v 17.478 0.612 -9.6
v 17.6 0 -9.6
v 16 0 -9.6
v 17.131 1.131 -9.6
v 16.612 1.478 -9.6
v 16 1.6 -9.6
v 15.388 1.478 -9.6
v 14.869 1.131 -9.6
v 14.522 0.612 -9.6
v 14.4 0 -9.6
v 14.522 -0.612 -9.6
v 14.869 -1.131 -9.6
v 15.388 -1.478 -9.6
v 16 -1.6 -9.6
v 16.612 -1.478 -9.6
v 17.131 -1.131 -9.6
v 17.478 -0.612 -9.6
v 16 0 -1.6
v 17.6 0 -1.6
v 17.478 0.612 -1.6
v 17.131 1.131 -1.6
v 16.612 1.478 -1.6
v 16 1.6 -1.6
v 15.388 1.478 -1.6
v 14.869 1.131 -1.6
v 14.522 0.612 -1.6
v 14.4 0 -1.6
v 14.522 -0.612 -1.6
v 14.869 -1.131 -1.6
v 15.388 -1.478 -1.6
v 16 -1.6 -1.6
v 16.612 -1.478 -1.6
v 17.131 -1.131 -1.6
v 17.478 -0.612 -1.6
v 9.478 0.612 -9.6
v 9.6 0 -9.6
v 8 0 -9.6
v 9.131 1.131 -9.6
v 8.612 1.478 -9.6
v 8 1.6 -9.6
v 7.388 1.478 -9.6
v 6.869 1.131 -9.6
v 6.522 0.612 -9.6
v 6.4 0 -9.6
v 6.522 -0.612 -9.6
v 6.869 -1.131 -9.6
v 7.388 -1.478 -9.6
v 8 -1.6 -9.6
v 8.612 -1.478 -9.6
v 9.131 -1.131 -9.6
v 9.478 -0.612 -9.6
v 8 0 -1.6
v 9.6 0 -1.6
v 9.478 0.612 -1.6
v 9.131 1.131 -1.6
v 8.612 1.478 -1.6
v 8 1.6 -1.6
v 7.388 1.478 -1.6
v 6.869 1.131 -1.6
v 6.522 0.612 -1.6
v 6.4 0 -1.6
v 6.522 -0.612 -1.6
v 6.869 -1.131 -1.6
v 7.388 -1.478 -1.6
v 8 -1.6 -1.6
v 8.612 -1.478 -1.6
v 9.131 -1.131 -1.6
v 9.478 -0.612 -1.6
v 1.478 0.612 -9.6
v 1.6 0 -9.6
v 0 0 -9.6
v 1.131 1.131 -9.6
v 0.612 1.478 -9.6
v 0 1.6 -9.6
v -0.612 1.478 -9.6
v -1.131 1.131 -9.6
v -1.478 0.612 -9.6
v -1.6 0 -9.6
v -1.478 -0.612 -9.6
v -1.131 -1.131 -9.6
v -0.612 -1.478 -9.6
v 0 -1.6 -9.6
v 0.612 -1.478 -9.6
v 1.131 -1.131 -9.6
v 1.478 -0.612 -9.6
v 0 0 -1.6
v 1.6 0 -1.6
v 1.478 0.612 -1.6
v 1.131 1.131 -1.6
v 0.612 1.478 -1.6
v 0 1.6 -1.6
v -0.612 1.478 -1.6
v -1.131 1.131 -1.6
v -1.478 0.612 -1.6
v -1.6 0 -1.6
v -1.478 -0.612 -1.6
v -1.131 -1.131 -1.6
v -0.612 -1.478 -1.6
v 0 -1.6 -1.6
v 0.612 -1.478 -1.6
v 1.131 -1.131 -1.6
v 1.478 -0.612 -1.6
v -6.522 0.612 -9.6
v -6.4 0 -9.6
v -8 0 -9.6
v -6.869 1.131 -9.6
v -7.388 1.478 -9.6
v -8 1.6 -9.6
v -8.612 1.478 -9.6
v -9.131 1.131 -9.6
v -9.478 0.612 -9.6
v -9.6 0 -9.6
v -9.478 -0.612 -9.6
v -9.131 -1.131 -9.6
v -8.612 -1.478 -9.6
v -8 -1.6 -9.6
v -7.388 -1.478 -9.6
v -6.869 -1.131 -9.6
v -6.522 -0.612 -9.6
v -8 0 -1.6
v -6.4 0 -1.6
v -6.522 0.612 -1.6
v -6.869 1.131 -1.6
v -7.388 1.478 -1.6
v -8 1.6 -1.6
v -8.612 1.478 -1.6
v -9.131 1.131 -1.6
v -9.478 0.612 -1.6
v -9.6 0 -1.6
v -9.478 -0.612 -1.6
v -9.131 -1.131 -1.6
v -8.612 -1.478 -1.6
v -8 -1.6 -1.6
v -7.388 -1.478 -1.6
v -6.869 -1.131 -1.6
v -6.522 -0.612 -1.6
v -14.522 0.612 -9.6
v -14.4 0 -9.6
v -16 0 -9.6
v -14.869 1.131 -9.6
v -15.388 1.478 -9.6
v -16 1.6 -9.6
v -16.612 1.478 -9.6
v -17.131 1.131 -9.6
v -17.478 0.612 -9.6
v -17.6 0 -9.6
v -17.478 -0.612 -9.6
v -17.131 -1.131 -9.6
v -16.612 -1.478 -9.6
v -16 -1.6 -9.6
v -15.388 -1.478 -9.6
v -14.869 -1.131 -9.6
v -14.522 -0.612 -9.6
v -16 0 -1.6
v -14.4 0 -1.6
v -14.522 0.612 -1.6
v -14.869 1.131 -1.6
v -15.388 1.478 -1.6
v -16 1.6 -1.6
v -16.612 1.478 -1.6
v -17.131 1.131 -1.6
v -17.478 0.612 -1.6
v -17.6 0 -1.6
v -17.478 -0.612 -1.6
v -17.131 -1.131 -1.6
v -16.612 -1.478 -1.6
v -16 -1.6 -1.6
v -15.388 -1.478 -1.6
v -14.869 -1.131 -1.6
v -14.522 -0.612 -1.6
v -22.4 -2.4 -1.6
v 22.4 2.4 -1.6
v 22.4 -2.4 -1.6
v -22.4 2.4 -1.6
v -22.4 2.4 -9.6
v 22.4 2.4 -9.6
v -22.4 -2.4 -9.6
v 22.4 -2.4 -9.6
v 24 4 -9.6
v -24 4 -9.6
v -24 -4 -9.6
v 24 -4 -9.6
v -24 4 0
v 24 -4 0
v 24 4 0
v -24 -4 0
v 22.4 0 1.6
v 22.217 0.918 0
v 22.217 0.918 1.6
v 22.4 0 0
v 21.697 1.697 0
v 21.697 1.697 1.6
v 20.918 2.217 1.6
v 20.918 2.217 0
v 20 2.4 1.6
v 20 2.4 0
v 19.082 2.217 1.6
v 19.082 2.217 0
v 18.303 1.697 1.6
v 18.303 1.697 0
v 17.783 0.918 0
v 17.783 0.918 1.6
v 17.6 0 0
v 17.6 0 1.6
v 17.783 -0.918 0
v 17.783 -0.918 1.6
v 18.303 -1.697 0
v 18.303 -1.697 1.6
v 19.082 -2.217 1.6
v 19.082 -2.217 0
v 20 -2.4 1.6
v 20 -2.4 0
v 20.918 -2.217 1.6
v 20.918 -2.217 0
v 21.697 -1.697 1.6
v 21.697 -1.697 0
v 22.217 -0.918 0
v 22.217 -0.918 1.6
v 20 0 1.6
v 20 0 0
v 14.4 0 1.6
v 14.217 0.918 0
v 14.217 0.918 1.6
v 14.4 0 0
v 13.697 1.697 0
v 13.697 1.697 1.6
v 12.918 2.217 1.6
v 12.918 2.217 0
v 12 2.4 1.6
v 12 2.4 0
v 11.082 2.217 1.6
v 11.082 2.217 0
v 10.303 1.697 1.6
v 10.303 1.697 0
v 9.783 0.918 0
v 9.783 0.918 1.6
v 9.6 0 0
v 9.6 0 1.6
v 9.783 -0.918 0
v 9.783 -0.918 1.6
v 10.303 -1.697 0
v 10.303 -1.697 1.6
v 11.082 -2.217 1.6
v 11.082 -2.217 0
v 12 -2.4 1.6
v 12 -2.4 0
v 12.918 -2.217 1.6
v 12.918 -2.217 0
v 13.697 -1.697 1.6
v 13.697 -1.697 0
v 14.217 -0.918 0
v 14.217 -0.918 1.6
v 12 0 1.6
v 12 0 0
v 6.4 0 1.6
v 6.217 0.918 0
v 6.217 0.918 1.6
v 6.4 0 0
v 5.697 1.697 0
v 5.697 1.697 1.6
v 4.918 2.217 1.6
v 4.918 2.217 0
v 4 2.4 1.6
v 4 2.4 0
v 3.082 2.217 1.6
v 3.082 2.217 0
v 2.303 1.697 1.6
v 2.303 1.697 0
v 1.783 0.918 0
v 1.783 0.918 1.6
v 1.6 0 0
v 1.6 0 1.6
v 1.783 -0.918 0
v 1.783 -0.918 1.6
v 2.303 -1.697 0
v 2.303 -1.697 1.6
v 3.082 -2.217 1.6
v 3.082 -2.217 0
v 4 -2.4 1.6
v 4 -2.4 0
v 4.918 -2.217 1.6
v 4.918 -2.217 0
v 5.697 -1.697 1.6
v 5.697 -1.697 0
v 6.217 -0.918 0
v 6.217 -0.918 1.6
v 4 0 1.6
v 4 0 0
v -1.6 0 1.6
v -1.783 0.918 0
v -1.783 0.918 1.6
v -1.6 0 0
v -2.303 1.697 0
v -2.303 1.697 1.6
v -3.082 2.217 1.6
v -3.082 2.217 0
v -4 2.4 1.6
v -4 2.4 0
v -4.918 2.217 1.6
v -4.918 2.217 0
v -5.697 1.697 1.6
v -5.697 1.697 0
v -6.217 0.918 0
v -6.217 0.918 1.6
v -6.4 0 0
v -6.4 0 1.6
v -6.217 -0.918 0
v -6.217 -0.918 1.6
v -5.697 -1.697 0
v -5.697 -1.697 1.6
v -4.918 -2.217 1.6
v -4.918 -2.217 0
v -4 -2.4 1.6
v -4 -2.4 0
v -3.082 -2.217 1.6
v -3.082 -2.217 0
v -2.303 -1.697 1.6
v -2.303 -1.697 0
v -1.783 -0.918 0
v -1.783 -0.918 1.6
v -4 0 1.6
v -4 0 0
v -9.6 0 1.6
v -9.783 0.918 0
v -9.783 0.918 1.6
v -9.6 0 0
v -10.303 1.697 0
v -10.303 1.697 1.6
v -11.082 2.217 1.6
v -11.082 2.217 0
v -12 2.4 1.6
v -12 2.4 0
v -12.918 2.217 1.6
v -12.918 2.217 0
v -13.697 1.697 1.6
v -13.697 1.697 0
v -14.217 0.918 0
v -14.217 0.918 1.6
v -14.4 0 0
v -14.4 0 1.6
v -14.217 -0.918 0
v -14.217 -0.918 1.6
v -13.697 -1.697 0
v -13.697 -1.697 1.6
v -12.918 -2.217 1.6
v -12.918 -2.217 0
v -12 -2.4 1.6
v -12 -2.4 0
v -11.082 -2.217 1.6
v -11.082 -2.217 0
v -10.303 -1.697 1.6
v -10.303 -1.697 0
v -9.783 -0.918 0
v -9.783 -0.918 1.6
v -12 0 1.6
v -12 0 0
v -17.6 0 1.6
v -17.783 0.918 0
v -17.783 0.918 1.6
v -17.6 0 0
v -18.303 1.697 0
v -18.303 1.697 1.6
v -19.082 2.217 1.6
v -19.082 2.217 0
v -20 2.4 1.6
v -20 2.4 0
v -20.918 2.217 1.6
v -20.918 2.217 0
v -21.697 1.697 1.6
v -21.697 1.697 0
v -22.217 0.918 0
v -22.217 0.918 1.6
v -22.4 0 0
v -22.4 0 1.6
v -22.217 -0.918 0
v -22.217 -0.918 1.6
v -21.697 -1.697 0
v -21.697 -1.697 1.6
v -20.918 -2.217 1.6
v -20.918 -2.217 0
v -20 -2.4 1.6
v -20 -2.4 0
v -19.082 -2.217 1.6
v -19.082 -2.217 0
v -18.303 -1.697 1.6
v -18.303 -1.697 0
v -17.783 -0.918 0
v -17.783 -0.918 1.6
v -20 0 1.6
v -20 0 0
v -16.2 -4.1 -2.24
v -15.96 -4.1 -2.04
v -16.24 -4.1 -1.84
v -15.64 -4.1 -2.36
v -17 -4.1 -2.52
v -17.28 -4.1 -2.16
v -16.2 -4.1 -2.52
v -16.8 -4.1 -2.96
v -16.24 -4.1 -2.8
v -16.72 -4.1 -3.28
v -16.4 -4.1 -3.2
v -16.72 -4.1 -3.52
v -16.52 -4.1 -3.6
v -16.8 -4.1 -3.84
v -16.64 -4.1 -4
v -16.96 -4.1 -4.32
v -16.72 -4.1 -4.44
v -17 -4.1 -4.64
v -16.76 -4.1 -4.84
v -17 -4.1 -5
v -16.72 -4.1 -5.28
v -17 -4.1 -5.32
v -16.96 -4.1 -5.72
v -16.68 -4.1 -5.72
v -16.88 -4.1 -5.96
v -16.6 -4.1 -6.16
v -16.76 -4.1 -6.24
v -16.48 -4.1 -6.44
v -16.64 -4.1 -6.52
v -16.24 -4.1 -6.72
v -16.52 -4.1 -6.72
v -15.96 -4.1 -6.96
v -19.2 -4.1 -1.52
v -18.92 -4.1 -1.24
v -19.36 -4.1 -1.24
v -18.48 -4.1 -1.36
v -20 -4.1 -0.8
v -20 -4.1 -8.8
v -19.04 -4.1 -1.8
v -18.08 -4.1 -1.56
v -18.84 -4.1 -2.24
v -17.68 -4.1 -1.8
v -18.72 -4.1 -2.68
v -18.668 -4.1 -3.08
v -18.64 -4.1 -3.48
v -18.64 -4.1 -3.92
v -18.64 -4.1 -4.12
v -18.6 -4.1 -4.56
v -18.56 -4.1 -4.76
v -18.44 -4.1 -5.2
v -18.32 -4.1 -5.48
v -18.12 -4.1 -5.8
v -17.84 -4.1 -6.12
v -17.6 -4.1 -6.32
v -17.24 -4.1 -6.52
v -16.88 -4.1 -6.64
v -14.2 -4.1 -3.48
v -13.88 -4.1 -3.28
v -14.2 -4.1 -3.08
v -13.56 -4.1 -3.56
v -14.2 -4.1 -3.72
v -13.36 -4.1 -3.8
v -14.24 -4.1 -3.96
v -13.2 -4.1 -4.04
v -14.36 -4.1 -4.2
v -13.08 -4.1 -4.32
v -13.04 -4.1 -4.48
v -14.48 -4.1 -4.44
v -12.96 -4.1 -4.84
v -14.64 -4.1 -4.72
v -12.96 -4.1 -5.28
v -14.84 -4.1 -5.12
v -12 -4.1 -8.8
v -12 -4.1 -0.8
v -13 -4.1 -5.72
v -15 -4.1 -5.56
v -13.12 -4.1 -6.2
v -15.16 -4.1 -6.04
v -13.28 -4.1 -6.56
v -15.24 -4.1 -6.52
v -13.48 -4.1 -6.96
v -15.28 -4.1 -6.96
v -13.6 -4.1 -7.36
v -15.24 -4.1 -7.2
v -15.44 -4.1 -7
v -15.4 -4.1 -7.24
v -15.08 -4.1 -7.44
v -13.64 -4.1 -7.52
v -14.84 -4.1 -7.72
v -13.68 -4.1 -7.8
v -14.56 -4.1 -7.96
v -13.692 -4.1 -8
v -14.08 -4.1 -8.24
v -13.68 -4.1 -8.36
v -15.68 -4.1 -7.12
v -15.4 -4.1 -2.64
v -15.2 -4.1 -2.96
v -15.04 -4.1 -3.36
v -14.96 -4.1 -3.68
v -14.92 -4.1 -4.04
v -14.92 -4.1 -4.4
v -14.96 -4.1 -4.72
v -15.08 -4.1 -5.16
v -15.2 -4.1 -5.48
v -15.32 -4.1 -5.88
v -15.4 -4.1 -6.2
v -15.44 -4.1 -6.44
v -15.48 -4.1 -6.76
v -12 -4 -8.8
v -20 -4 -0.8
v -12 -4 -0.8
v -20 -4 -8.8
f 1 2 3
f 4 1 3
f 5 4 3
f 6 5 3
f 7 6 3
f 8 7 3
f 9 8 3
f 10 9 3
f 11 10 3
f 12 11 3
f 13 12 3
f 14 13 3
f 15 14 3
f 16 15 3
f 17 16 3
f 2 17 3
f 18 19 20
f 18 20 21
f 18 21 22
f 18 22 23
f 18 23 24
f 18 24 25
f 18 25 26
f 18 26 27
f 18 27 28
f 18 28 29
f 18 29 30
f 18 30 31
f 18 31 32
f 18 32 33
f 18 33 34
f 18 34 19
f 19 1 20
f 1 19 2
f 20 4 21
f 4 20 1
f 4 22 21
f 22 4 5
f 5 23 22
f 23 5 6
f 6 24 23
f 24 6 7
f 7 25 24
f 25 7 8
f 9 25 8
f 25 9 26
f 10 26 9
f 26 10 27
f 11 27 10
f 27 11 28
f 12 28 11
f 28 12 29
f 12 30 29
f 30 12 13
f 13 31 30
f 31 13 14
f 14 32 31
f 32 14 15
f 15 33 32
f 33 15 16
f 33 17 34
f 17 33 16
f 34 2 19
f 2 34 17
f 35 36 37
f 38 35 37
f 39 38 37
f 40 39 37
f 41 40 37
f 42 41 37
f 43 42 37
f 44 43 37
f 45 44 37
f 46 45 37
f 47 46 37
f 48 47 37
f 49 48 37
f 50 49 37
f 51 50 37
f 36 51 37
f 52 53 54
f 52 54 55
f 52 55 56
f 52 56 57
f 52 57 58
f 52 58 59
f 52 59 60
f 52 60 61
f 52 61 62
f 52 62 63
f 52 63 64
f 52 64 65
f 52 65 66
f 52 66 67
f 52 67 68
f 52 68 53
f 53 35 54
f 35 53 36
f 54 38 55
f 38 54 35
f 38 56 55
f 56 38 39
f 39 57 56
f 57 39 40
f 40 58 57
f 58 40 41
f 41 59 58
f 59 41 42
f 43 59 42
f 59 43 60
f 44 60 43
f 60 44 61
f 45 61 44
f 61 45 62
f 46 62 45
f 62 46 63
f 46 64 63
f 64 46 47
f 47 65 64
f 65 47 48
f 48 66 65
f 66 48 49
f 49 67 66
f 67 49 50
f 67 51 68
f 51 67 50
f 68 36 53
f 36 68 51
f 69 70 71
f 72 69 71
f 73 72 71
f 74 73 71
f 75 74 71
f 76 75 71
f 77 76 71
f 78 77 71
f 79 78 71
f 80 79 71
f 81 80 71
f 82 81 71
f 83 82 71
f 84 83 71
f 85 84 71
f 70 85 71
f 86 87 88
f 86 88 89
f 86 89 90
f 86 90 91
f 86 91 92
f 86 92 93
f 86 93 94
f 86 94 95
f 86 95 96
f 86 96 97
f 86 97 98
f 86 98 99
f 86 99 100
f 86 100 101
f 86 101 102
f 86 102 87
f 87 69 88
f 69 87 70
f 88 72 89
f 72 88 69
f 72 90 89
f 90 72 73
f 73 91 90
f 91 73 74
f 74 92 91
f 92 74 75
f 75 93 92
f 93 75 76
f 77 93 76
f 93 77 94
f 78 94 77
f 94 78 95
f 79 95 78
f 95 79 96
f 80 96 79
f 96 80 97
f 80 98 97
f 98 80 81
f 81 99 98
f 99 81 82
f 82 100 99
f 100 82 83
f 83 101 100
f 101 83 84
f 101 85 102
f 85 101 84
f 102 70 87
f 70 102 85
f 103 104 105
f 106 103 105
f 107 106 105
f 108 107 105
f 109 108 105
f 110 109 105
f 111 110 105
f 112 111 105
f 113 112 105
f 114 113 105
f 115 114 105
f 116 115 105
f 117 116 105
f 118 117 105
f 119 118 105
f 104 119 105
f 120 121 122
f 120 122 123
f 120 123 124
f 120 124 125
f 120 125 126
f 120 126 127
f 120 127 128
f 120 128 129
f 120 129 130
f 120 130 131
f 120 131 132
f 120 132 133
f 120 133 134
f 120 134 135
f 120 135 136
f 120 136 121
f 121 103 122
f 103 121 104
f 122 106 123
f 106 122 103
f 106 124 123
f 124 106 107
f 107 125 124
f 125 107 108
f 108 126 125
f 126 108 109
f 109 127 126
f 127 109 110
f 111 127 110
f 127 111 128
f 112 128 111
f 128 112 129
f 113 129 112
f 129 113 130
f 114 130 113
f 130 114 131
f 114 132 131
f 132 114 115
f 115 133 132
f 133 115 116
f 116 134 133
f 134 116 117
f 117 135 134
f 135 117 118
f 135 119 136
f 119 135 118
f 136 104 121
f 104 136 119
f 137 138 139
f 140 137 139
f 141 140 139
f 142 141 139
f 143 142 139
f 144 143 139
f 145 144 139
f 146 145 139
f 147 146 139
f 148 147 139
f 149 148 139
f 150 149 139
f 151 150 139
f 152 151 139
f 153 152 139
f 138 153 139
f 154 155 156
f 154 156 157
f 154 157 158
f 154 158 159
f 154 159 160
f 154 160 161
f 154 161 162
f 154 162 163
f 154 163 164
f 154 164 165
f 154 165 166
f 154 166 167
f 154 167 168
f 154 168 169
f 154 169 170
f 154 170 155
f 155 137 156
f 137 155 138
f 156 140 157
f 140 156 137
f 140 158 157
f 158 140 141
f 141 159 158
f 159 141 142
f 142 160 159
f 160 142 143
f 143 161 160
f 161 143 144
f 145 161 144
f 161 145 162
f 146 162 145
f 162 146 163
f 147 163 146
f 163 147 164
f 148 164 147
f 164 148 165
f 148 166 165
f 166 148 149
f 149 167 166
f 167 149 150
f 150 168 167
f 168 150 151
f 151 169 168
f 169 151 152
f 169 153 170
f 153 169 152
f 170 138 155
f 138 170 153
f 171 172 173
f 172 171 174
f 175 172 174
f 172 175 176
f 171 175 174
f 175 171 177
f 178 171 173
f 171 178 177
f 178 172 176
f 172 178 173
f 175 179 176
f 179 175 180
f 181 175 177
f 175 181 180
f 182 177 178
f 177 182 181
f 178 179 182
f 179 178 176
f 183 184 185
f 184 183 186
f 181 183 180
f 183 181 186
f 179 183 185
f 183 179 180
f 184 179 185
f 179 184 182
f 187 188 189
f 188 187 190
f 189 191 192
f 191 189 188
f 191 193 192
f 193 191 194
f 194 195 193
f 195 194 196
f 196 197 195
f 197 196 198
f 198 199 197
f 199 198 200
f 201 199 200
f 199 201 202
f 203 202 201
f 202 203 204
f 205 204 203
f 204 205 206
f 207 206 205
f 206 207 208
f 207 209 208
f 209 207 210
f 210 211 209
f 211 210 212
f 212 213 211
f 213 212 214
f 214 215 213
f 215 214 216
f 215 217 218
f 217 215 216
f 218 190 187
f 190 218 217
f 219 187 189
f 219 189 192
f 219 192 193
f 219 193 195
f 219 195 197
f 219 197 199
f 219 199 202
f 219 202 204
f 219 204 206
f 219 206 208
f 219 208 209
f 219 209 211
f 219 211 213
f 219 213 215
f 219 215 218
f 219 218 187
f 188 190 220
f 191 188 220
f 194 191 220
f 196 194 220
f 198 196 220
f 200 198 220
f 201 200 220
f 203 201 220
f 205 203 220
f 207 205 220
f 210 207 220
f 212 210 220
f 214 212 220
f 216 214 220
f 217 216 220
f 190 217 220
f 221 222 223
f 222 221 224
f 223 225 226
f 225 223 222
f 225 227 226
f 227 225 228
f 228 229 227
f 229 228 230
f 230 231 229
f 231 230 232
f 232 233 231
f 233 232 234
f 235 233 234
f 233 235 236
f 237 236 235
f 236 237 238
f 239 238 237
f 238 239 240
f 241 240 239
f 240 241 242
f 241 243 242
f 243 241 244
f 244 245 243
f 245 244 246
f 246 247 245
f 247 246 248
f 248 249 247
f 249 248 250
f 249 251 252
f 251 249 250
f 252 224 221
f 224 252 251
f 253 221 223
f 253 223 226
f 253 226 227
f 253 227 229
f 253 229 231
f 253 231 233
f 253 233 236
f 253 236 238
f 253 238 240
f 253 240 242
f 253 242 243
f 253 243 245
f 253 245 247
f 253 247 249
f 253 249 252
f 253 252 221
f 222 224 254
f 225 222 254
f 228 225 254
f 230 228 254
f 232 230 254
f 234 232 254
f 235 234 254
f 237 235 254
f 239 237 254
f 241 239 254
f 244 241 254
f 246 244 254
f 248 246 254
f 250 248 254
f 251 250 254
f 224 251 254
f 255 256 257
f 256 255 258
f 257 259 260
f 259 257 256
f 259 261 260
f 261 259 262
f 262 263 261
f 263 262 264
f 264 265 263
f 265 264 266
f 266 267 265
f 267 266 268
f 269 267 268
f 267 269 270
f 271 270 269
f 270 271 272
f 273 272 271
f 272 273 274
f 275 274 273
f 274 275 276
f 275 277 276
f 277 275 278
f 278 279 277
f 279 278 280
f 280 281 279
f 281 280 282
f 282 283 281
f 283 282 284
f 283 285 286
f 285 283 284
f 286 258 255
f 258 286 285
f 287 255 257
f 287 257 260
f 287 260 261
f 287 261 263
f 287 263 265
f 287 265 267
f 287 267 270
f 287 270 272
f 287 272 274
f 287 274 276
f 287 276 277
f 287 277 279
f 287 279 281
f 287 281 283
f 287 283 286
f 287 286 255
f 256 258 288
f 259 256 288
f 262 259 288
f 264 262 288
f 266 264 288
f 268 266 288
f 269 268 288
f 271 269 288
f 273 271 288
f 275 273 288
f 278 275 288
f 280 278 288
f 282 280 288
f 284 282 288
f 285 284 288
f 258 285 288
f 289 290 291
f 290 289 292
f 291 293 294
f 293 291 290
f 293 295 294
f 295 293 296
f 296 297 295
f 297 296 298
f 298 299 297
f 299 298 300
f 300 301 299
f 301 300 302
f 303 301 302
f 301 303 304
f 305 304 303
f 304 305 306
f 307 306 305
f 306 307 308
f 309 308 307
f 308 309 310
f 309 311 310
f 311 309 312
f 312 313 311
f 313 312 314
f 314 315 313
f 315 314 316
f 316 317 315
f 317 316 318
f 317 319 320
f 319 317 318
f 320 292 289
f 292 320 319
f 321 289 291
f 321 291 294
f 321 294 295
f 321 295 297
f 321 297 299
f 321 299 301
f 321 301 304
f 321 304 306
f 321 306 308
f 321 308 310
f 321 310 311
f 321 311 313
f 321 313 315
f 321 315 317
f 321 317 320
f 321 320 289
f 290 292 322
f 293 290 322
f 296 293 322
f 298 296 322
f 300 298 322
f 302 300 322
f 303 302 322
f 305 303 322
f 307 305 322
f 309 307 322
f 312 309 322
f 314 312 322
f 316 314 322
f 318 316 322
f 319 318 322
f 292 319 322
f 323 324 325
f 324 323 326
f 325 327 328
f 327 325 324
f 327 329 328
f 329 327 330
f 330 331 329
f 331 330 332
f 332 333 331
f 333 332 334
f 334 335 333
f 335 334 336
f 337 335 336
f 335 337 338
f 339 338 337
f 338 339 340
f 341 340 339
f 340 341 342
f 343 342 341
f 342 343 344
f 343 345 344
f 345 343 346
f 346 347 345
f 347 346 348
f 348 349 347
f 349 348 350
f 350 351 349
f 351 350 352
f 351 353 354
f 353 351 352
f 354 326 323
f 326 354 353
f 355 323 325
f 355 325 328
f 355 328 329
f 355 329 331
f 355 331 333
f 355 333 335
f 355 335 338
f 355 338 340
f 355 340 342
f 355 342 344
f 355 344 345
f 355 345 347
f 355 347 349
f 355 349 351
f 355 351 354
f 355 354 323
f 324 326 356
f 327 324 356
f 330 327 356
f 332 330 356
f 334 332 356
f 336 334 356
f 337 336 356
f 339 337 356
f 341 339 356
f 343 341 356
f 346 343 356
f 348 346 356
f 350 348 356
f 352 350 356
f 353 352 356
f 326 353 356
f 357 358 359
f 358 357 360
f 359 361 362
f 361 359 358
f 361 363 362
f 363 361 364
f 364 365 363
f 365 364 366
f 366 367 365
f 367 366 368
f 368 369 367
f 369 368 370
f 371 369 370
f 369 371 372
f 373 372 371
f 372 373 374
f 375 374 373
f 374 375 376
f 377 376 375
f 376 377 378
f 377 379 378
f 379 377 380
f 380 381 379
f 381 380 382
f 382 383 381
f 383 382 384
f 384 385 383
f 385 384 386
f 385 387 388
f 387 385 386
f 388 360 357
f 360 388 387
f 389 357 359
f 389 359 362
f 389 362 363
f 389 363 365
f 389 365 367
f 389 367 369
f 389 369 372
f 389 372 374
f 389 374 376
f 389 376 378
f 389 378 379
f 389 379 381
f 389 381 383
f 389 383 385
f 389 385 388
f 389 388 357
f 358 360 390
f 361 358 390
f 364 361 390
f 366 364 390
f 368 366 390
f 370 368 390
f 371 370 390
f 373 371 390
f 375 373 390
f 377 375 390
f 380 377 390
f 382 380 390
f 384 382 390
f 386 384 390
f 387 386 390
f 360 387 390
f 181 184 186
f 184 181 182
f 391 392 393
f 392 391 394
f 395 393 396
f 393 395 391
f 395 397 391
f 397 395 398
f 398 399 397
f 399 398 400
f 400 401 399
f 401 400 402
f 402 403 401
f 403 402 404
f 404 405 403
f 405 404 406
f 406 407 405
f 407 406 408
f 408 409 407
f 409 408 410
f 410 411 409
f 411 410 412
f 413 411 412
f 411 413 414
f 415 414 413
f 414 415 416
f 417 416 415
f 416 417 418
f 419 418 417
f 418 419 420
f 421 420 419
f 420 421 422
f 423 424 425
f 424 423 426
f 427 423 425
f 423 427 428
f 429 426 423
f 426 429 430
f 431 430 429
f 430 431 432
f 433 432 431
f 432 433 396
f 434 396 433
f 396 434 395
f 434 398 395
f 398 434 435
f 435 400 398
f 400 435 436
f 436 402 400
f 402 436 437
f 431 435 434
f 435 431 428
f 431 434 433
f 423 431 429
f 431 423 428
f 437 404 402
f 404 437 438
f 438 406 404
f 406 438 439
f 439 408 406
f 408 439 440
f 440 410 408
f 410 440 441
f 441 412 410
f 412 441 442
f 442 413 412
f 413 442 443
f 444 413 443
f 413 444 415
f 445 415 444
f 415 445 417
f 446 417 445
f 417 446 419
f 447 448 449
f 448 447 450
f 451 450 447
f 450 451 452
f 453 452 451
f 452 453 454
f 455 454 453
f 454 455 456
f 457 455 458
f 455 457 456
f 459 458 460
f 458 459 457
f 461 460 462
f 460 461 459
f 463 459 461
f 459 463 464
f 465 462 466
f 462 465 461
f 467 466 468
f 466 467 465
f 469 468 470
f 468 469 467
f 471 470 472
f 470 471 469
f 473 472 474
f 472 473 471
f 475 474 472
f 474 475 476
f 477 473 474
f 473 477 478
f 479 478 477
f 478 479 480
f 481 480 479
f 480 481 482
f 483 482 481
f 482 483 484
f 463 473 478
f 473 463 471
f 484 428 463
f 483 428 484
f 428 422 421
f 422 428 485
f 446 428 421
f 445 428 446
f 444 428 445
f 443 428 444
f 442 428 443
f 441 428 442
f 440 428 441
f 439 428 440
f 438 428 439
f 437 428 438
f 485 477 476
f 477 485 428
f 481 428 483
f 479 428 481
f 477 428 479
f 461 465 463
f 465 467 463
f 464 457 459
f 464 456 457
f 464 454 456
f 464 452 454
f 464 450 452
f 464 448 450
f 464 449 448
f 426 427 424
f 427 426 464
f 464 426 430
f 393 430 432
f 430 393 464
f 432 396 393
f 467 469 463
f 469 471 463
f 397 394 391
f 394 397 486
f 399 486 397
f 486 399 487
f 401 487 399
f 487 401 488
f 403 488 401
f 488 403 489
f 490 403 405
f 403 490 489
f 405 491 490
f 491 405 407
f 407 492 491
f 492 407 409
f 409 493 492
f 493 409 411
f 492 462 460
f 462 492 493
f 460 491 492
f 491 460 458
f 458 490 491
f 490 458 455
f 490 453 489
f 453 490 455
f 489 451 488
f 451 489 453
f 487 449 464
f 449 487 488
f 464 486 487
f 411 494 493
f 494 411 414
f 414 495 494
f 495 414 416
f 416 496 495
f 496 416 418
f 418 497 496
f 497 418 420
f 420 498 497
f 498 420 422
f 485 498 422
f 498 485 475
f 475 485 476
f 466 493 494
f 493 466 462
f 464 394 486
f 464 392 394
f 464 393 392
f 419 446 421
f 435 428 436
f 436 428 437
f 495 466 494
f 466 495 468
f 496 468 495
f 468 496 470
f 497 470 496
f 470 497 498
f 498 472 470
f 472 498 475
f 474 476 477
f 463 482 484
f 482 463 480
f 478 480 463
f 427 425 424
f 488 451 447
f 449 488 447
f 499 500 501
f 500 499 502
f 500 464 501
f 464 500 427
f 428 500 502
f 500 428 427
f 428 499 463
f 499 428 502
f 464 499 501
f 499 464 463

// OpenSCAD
// file: ../p/4-4edge.scad
use <../lib.scad>
function ldraw_lib__4_4edge() = [
// 0 Circle 1.0
// 0 Name: 4-4edge.dat
// 0 Author: James Jessiman
// 0 !LDRAW_ORG Primitive UPDATE 2017-01
// 0 !LICENSE Licensed under CC BY 2.0 and CC BY 4.0 : see CAreadme.txt
// 
// 0 BFC CERTIFY CCW
  [0,"BFC","CERTIFY"],
  [0,"BFC","CCW"],
// 
// 0 !HISTORY 1998-12-15 [PTadmin] Official Update 1998-10
// 0 !HISTORY 2005-12-28 [PTadmin] Official Update 2005-01
// 0 !HISTORY 2007-06-24 [PTadmin] Header formatted for Contributor Agreement
// 0 !HISTORY 2008-07-01 [PTadmin] Official Update 2008-01
// 0 !HISTORY 2017-01-15 [Steffen] BFCed
// 0 !HISTORY 2017-12-30 [PTadmin] Official Update 2017-01
// 
// 
// 2 24 1 0 0 0.9239 0 0.3827
  [2,24,1,0,0,0.9239,0,0.3827],
// 2 24 0.9239 0 0.3827 0.7071 0 0.7071
  [2,24,0.9239,0,0.3827,0.7071,0,0.7071],
// 2 24 0.7071 0 0.7071 0.3827 0 0.9239
  [2,24,0.7071,0,0.7071,0.3827,0,0.9239],
// 2 24 0.3827 0 0.9239 0 0 1
  [2,24,0.3827,0,0.9239,0,0,1],
// 2 24 0 0 1 -0.3827 0 0.9239
  [2,24,0,0,1,-0.3827,0,0.9239],
// 2 24 -0.3827 0 0.9239 -0.7071 0 0.7071
  [2,24,-0.3827,0,0.9239,-0.7071,0,0.7071],
// 2 24 -0.7071 0 0.7071 -0.9239 0 0.3827
  [2,24,-0.7071,0,0.7071,-0.9239,0,0.3827],
// 2 24 -0.9239 0 0.3827 -1 0 -0
  [2,24,-0.9239,0,0.3827,-1,0,-0],
// 2 24 -1 0 -0 -0.9239 0 -0.3827
  [2,24,-1,0,-0,-0.9239,0,-0.3827],
// 2 24 -0.9239 0 -0.3827 -0.7071 0 -0.7071
  [2,24,-0.9239,0,-0.3827,-0.7071,0,-0.7071],
// 2 24 -0.7071 0 -0.7071 -0.3827 0 -0.9239
  [2,24,-0.7071,0,-0.7071,-0.3827,0,-0.9239],
// 2 24 -0.3827 0 -0.9239 0 0 -1
  [2,24,-0.3827,0,-0.9239,0,0,-1],
// 2 24 0 0 -1 0.3827 0 -0.9239
  [2,24,0,0,-1,0.3827,0,-0.9239],
// 2 24 0.3827 0 -0.9239 0.7071 0 -0.7071
  [2,24,0.3827,0,-0.9239,0.7071,0,-0.7071],
// 2 24 0.7071 0 -0.7071 0.9239 0 -0.3827
  [2,24,0.7071,0,-0.7071,0.9239,0,-0.3827],
// 2 24 0.9239 0 -0.3827 1 0 0
  [2,24,0.9239,0,-0.3827,1,0,0],
];
module ldraw_lib__4_4edge(step=0, col=false, unit=2/5, alt=false, line=0.2, solid=!$preview)
    makepoly(ldraw_lib__4_4edge(), step=step, col=col, unit=unit, alt=alt, line=line, solid=solid);
ldraw_lib__4_4edge(line=0.2);
// file: ../p/4-4disc.scad
use <../lib.scad>
function ldraw_lib__4_4disc() = [
// 0 Disc 1.0
// 0 Name: 4-4disc.dat
// 0 Author: James Jessiman
// 0 !LDRAW_ORG Primitive UPDATE 2002-02
// 0 !LICENSE Licensed under CC BY 2.0 and CC BY 4.0 : see CAreadme.txt
// 
// 0 BFC CERTIFY CCW
  [0,"BFC","CERTIFY"],
  [0,"BFC","CCW"],
// 
// 0 !HISTORY 1998-12-15 [PTadmin] Official Update 1998-10
// 0 !HISTORY 2002-03-23 [sbliss] Added BFC statement
// 0 !HISTORY 2002-04-25 [PTadmin] Official Update 2002-02
// 0 !HISTORY 2007-06-24 [PTadmin] Header formatted for Contributor Agreement
// 0 !HISTORY 2008-07-01 [PTadmin] Official Update 2008-01
// 
// 
// 3 16 0 0 0 1 0 0 0.9239 0 0.3827
  [3,16,0,0,0,1,0,0,0.9239,0,0.3827],
// 3 16 0 0 0 0.9239 0 0.3827 0.7071 0 0.7071
  [3,16,0,0,0,0.9239,0,0.3827,0.7071,0,0.7071],
// 3 16 0 0 0 0.7071 0 0.7071 0.3827 0 0.9239
  [3,16,0,0,0,0.7071,0,0.7071,0.3827,0,0.9239],
// 3 16 0 0 0 0.3827 0 0.9239 0 0 1
  [3,16,0,0,0,0.3827,0,0.9239,0,0,1],
// 3 16 0 0 0 0 0 1 -0.3827 0 0.9239
  [3,16,0,0,0,0,0,1,-0.3827,0,0.9239],
// 3 16 0 0 0 -0.3827 0 0.9239 -0.7071 0 0.7071
  [3,16,0,0,0,-0.3827,0,0.9239,-0.7071,0,0.7071],
// 3 16 0 0 0 -0.7071 0 0.7071 -0.9239 0 0.3827
  [3,16,0,0,0,-0.7071,0,0.7071,-0.9239,0,0.3827],
// 3 16 0 0 0 -0.9239 0 0.3827 -1 0 -0
  [3,16,0,0,0,-0.9239,0,0.3827,-1,0,-0],
// 3 16 0 0 0 -1 0 -0 -0.9239 0 -0.3827
  [3,16,0,0,0,-1,0,-0,-0.9239,0,-0.3827],
// 3 16 0 0 0 -0.9239 0 -0.3827 -0.7071 0 -0.7071
  [3,16,0,0,0,-0.9239,0,-0.3827,-0.7071,0,-0.7071],
// 3 16 0 0 0 -0.7071 0 -0.7071 -0.3827 0 -0.9239
  [3,16,0,0,0,-0.7071,0,-0.7071,-0.3827,0,-0.9239],
// 3 16 0 0 0 -0.3827 0 -0.9239 0 0 -1
  [3,16,0,0,0,-0.3827,0,-0.9239,0,0,-1],
// 3 16 0 0 0 0 0 -1 0.3827 0 -0.9239
  [3,16,0,0,0,0,0,-1,0.3827,0,-0.9239],
// 3 16 0 0 0 0.3827 0 -0.9239 0.7071 0 -0.7071
  [3,16,0,0,0,0.3827,0,-0.9239,0.7071,0,-0.7071],
// 3 16 0 0 0 0.7071 0 -0.7071 0.9239 0 -0.3827
  [3,16,0,0,0,0.7071,0,-0.7071,0.9239,0,-0.3827],
// 3 16 0 0 0 0.9239 0 -0.3827 1 0 0
  [3,16,0,0,0,0.9239,0,-0.3827,1,0,0],
// 0
];
module ldraw_lib__4_4disc(step=0, col=false, unit=2/5, alt=false, line=0.2, solid=!$preview)
    makepoly(ldraw_lib__4_4disc(), step=step, col=col, unit=unit, alt=alt, line=line, solid=solid);
ldraw_lib__4_4disc(line=0.2);
// file: ../p/4-4cyli.scad
use <../lib.scad>
$fa=1; $fs=0.2;
function ldraw_lib__4_4cyli(realsolid=false) = [
// 0 Cylinder 1.0
// 0 Name: 4-4cyli.dat
// 0 Author: James Jessiman
// 0 !LDRAW_ORG Primitive UPDATE 2005-01
// 0 !LICENSE Licensed under CC BY 2.0 and CC BY 4.0 : see CAreadme.txt
// 
// 0 BFC CERTIFY CCW
  [0,"BFC","CERTIFY"],
  [0,"BFC","CCW"],
// 
// 0 !HISTORY 1998-12-15 [PTadmin] Official Update 1998-10
// 0 !HISTORY 2002-03-23 [sbliss] Added BFC statement; merged headers from files in distributions LDraw 0.27 and Complete.
// 0 !HISTORY 2002-04-25 [PTadmin] Official Update 2002-02
// 0 !HISTORY 2004-12-14 [guyvivan] BFC CCW
// 0 !HISTORY 2005-12-28 [PTadmin] Official Update 2005-01
// 0 !HISTORY 2007-06-24 [PTadmin] Header formatted for Contributor Agreement
// 0 !HISTORY 2008-07-01 [PTadmin] Official Update 2008-01
// 
// 
// 4 16 1 1 0 0.9239 1 0.3827 0.9239 0 0.3827 1 0 0
  [4,16,1,1,0,0.9239,1,0.3827,0.9239,0,0.3827,1,0,0],
// 5 24 1 0 0 1 1 0 0.9239 0 0.3827 0.9239 0 -0.3827
  [5,24,1,0,0,1,1,0,0.9239,0,0.3827,0.9239,0,-0.3827],
// 4 16 0.9239 1 0.3827 0.7071 1 0.7071 0.7071 0 0.7071 0.9239 0 0.3827
  [4,16,0.9239,1,0.3827,0.7071,1,0.7071,0.7071,0,0.7071,0.9239,0,0.3827],
// 5 24 0.9239 0 0.3827 0.9239 1 0.3827 0.7071 0 0.7071 1 0 0
  [5,24,0.9239,0,0.3827,0.9239,1,0.3827,0.7071,0,0.7071,1,0,0],
// 4 16 0.7071 1 0.7071 0.3827 1 0.9239 0.3827 0 0.9239 0.7071 0 0.7071
  [4,16,0.7071,1,0.7071,0.3827,1,0.9239,0.3827,0,0.9239,0.7071,0,0.7071],
// 5 24 0.7071 0 0.7071 0.7071 1 0.7071 0.3827 0 0.9239 0.9239 0 0.3827
  [5,24,0.7071,0,0.7071,0.7071,1,0.7071,0.3827,0,0.9239,0.9239,0,0.3827],
// 4 16 0.3827 1 0.9239 0 1 1 0 0 1 0.3827 0 0.9239
  [4,16,0.3827,1,0.9239,0,1,1,0,0,1,0.3827,0,0.9239],
// 5 24 0.3827 0 0.9239 0.3827 1 0.9239 0 0 1 0.7071 0 0.7071
  [5,24,0.3827,0,0.9239,0.3827,1,0.9239,0,0,1,0.7071,0,0.7071],
// 4 16 0 1 1 -0.3827 1 0.9239 -0.3827 0 0.9239 0 0 1
  [4,16,0,1,1,-0.3827,1,0.9239,-0.3827,0,0.9239,0,0,1],
// 5 24 0 0 1 0 1 1 -0.3827 0 0.9239 0.3827 0 0.9239
  [5,24,0,0,1,0,1,1,-0.3827,0,0.9239,0.3827,0,0.9239],
// 4 16 -0.3827 1 0.9239 -0.7071 1 0.7071 -0.7071 0 0.7071 -0.3827 0 0.9239
  [4,16,-0.3827,1,0.9239,-0.7071,1,0.7071,-0.7071,0,0.7071,-0.3827,0,0.9239],
// 5 24 -0.3827 0 0.9239 -0.3827 1 0.9239 -0.7071 0 0.7071 0 0 1
  [5,24,-0.3827,0,0.9239,-0.3827,1,0.9239,-0.7071,0,0.7071,0,0,1],
// 4 16 -0.7071 1 0.7071 -0.9239 1 0.3827 -0.9239 0 0.3827 -0.7071 0 0.7071
  [4,16,-0.7071,1,0.7071,-0.9239,1,0.3827,-0.9239,0,0.3827,-0.7071,0,0.7071],
// 5 24 -0.7071 0 0.7071 -0.7071 1 0.7071 -0.9239 0 0.3827 -0.3827 0 0.9239
  [5,24,-0.7071,0,0.7071,-0.7071,1,0.7071,-0.9239,0,0.3827,-0.3827,0,0.9239],
// 4 16 -0.9239 1 0.3827 -1 1 0 -1 0 0 -0.9239 0 0.3827
  [4,16,-0.9239,1,0.3827,-1,1,0,-1,0,0,-0.9239,0,0.3827],
// 5 24 -0.9239 0 0.3827 -0.9239 1 0.3827 -1 0 0 -0.7071 0 0.7071
  [5,24,-0.9239,0,0.3827,-0.9239,1,0.3827,-1,0,0,-0.7071,0,0.7071],
// 4 16 -1 1 0 -0.9239 1 -0.3827 -0.9239 0 -0.3827 -1 0 0
  [4,16,-1,1,0,-0.9239,1,-0.3827,-0.9239,0,-0.3827,-1,0,0],
// 5 24 -1 0 0 -1 1 0 -0.9239 0 -0.3827 -0.9239 0 0.3827
  [5,24,-1,0,0,-1,1,0,-0.9239,0,-0.3827,-0.9239,0,0.3827],
// 4 16 -0.9239 1 -0.3827 -0.7071 1 -0.7071 -0.7071 0 -0.7071 -0.9239 0 -0.3827
  [4,16,-0.9239,1,-0.3827,-0.7071,1,-0.7071,-0.7071,0,-0.7071,-0.9239,0,-0.3827],
// 5 24 -0.9239 0 -0.3827 -0.9239 1 -0.3827 -0.7071 0 -0.7071 -1 0 0
  [5,24,-0.9239,0,-0.3827,-0.9239,1,-0.3827,-0.7071,0,-0.7071,-1,0,0],
// 4 16 -0.7071 1 -0.7071 -0.3827 1 -0.9239 -0.3827 0 -0.9239 -0.7071 0 -0.7071
  [4,16,-0.7071,1,-0.7071,-0.3827,1,-0.9239,-0.3827,0,-0.9239,-0.7071,0,-0.7071],
// 5 24 -0.7071 0 -0.7071 -0.7071 1 -0.7071 -0.3827 0 -0.9239 -0.9239 0 -0.3827
  [5,24,-0.7071,0,-0.7071,-0.7071,1,-0.7071,-0.3827,0,-0.9239,-0.9239,0,-0.3827],
// 4 16 -0.3827 1 -0.9239 0 1 -1 0 0 -1 -0.3827 0 -0.9239
  [4,16,-0.3827,1,-0.9239,0,1,-1,0,0,-1,-0.3827,0,-0.9239],
// 5 24 -0.3827 0 -0.9239 -0.3827 1 -0.9239 0 0 -1 -0.7071 0 -0.7071
  [5,24,-0.3827,0,-0.9239,-0.3827,1,-0.9239,0,0,-1,-0.7071,0,-0.7071],
// 4 16 0 1 -1 0.3827 1 -0.9239 0.3827 0 -0.9239 0 0 -1
  [4,16,0,1,-1,0.3827,1,-0.9239,0.3827,0,-0.9239,0,0,-1],
// 5 24 0 0 -1 0 1 -1 0.3827 0 -0.9239 -0.3827 0 -0.9239
  [5,24,0,0,-1,0,1,-1,0.3827,0,-0.9239,-0.3827,0,-0.9239],
// 4 16 0.3827 1 -0.9239 0.7071 1 -0.7071 0.7071 0 -0.7071 0.3827 0 -0.9239
  [4,16,0.3827,1,-0.9239,0.7071,1,-0.7071,0.7071,0,-0.7071,0.3827,0,-0.9239],
// 5 24 0.3827 0 -0.9239 0.3827 1 -0.9239 0.7071 0 -0.7071 0 0 -1
  [5,24,0.3827,0,-0.9239,0.3827,1,-0.9239,0.7071,0,-0.7071,0,0,-1],
// 4 16 0.7071 1 -0.7071 0.9239 1 -0.3827 0.9239 0 -0.3827 0.7071 0 -0.7071
  [4,16,0.7071,1,-0.7071,0.9239,1,-0.3827,0.9239,0,-0.3827,0.7071,0,-0.7071],
// 5 24 0.7071 0 -0.7071 0.7071 1 -0.7071 0.9239 0 -0.3827 0.3827 0 -0.9239
  [5,24,0.7071,0,-0.7071,0.7071,1,-0.7071,0.9239,0,-0.3827,0.3827,0,-0.9239],
// 4 16 0.9239 1 -0.3827 1 1 0 1 0 0 0.9239 0 -0.3827
  [4,16,0.9239,1,-0.3827,1,1,0,1,0,0,0.9239,0,-0.3827],
// 5 24 0.9239 0 -0.3827 0.9239 1 -0.3827 1 0 0 0.7071 0 -0.7071
  [5,24,0.9239,0,-0.3827,0.9239,1,-0.3827,1,0,0,0.7071,0,-0.7071],
// 0
];
module ldraw_lib__4_4cyli(step=0, col=false, unit=2/5, alt=false, line=0.2, solid=!$preview)
    makepoly(ldraw_lib__4_4cyli(solid), step=step, col=col, unit=unit, alt=alt, line=line, solid=solid);
ldraw_lib__4_4cyli(line=0.2);
// file: ../p/stud3.scad
use <../lib.scad>
use <4-4cyli.scad>
use <4-4disc.scad>
use <4-4edge.scad>
function ldraw_lib__stud3() = [
// 0 Stud Tube Solid
// 0 Name: stud3.dat
// 0 Author: James Jessiman
// 0 !LDRAW_ORG Primitive UPDATE 2012-01
// 0 !LICENSE Licensed under CC BY 4.0 : see CAreadme.txt
// 
// 0 BFC CERTIFY CCW
  [0,"BFC","CERTIFY"],
  [0,"BFC","CCW"],
// 
// 0 !HISTORY 2002-04-04 [sbliss] Modified for BFC compliance
// 0 !HISTORY 2002-04-25 [PTadmin] Official Update 2002-02
// 0 !HISTORY 2007-06-24 [PTadmin] Header formatted for Contributor Agreement
// 0 !HISTORY 2008-07-01 [PTadmin] Official Update 2008-01
// 0 !HISTORY 2012-02-16 [Philo] Changed to CCW
// 0 !HISTORY 2012-03-30 [PTadmin] Official Update 2012-01
// 
// 
// 1 16 0 -4 0 4 0 0 0 1 0 0 0 4 4-4edge.dat
  [1,16,0,-4,0,4,0,0,0,1,0,0,0,4, ldraw_lib__4_4edge()],
// 1 16 0 0 0 4 0 0 0 1 0 0 0 4 4-4edge.dat
  [1,16,0,0,0,4,0,0,0,1,0,0,0,4, ldraw_lib__4_4edge()],
// 1 16 0 -4 0 4 0 0 0 1 0 0 0 4 4-4disc.dat
  [1,16,0,-4,0,4,0,0,0,1,0,0,0,4, ldraw_lib__4_4disc()],
  [-1,16,0,0,0,4,0,0,0,-1,0,0,0,4, ldraw_lib__4_4disc()],
// 1 16 0 -4 0 4 0 0 0 4 0 0 0 4 4-4cyli.dat
  [1,16,0,-4,0,4,0,0,0,4,0,0,0,4, ldraw_lib__4_4cyli()],
];
module ldraw_lib__stud3(step=0, col=false, unit=2/5, alt=false, line=0.2, solid=!$preview)
    makepoly(ldraw_lib__stud3(), step=step, col=col, unit=unit, alt=alt, line=line, solid=solid);
ldraw_lib__stud3(line=0.2);
// file: ../p/stud.scad
use <../lib.scad>
use <4-4cyli.scad>
use <4-4disc.scad>
use <4-4edge.scad>
function ldraw_lib__stud() = [
// 0 Stud
// 0 Name: stud.dat
// 0 Author: James Jessiman
// 0 !LDRAW_ORG Primitive UPDATE 2012-01
// 0 !LICENSE Licensed under CC BY 4.0 : see CAreadme.txt
// 
// 0 BFC CERTIFY CCW
  [0,"BFC","CERTIFY"],
  [0,"BFC","CCW"],
// 
// 0 !HISTORY 2002-04-04 [sbliss] Modified for BFC compliance
// 0 !HISTORY 2002-04-25 [PTadmin] Official Update 2002-02
// 0 !HISTORY 2007-06-24 [PTadmin] Header formatted for Contributor Agreement
// 0 !HISTORY 2008-07-01 [PTadmin] Official Update 2008-01
// 0 !HISTORY 2012-02-16 [Philo] Changed to CCW
// 0 !HISTORY 2012-03-30 [PTadmin] Official Update 2012-01
// 
// 
// 1 16 0 0 0 6 0 0 0 1 0 0 0 6 4-4edge.dat
  [1,16,0,0,0,6,0,0,0,1,0,0,0,6, ldraw_lib__4_4edge()],
// 1 16 0 -4 0 6 0 0 0 1 0 0 0 6 4-4edge.dat
  [1,16,0,-4,0,6,0,0,0,1,0,0,0,6, ldraw_lib__4_4edge()],
// 1 16 0 0 0 6 0 0 0 -4 0 0 0 6 4-4cyli.dat
  [1,16,0,0,0,6,0,0,0,-4,0,0,0,6, ldraw_lib__4_4cyli()],
// 1 16 0 -4 0 6 0 0 0 1 0 0 0 6 4-4disc.dat
  [1,16,0,-4,0,6,0,0,0,1,0,0,0,6, ldraw_lib__4_4disc()],
  [-1,16,0,0,0,6,0,0,0,-1,0,0,0,6, ldraw_lib__4_4disc()],
];
module ldraw_lib__stud(step=0, col=false, unit=2/5, alt=false, line=0.2, solid=!$preview)
    makepoly(ldraw_lib__stud(), step=step, col=col, unit=unit, alt=alt, line=line, solid=solid);
ldraw_lib__stud(line=0.2);
// file: ../p/box5.scad
use <../lib.scad>
function ldraw_lib__box5() = [
// 0 Box with 5 Faces and All Edges
// 0 Name: box5.dat
// 0 Author: James Jessiman
// 0 !LDRAW_ORG Primitive UPDATE 2012-01
// 0 !LICENSE Licensed under CC BY 2.0 and CC BY 4.0 : see CAreadme.txt
// 
// 0 BFC CERTIFY CCW
  [0,"BFC","CERTIFY"],
  [0,"BFC","CCW"],
// 
// 0 !HISTORY 2002-04-03 [sbliss] Modified for BFC compliance
// 0 !HISTORY 2002-04-25 [PTadmin] Official Update 2002-02
// 0 !HISTORY 2007-06-24 [PTadmin] Header formatted for Contributor Agreement
// 0 !HISTORY 2008-07-01 [PTadmin] Official Update 2008-01
// 0 !HISTORY 2012-02-16 [Philo] Changed to CCW
// 0 !HISTORY 2012-03-30 [PTadmin] Official Update 2012-01
// 
// 
// 2 24 1 1 1 -1 1 1
  [2,24,1,1,1,-1,1,1],
// 2 24 -1 1 1 -1 1 -1
  [2,24,-1,1,1,-1,1,-1],
// 2 24 -1 1 -1 1 1 -1
  [2,24,-1,1,-1,1,1,-1],
// 2 24 1 1 -1 1 1 1
  [2,24,1,1,-1,1,1,1],
// 2 24 1 0 1 -1 0 1
  [2,24,1,0,1,-1,0,1],
// 2 24 -1 0 1 -1 0 -1
  [2,24,-1,0,1,-1,0,-1],
// 2 24 -1 0 -1 1 0 -1
  [2,24,-1,0,-1,1,0,-1],
// 2 24 1 0 -1 1 0 1
  [2,24,1,0,-1,1,0,1],
// 2 24 1 0 1 1 1 1
  [2,24,1,0,1,1,1,1],
// 2 24 -1 0 1 -1 1 1
  [2,24,-1,0,1,-1,1,1],
// 2 24 1 0 -1 1 1 -1
  [2,24,1,0,-1,1,1,-1],
// 2 24 -1 0 -1 -1 1 -1
  [2,24,-1,0,-1,-1,1,-1],
// 4 16 -1 1 1 1 1 1 1 1 -1 -1 1 -1
  [4,16,-1,1,1,1,1,1,1,1,-1,-1,1,-1],
// 4 16 -1 1 1 -1 0 1 1 0 1 1 1 1
  [4,16,-1,1,1,-1,0,1,1,0,1,1,1,1],
// 4 16 -1 1 -1 -1 0 -1 -1 0 1 -1 1 1
  [4,16,-1,1,-1,-1,0,-1,-1,0,1,-1,1,1],
// 4 16 1 1 -1 1 0 -1 -1 0 -1 -1 1 -1
  [4,16,1,1,-1,1,0,-1,-1,0,-1,-1,1,-1],
// 4 16 1 1 1 1 0 1 1 0 -1 1 1 -1
  [4,16,1,1,1,1,0,1,1,0,-1,1,1,-1],
];
makepoly(ldraw_lib__box5(), line=0.2);
// file: ../p/box5-12.scad
use <../lib.scad>
function ldraw_lib__box5_12() = [
// 0 Box with 5 Faces without Any Edges
// 0 Name: box5-12.dat
// 0 Author: Chris Dee [cwdee]
// 0 !LDRAW_ORG Primitive UPDATE 2009-02
// 0 !LICENSE Licensed under CC BY 2.0 and CC BY 4.0 : see CAreadme.txt
// 
// 0 BFC CERTIFY CCW
  [0,"BFC","CERTIFY"],
  [0,"BFC","CCW"],
// 
// 0 !HISTORY 2009-09-03 [PTadmin] Official Update 2009-02
// 
// 
// 4 16 1 1 1 1 1 -1 -1 1 -1 -1 1 1
  [4,16,1,1,1,1,1,-1,-1,1,-1,-1,1,1],
// 4 16 -1 0 1 1 0 1 1 1 1 -1 1 1
  [4,16,-1,0,1,1,0,1,1,1,1,-1,1,1],
// 4 16 -1 0 -1 -1 0 1 -1 1 1 -1 1 -1
  [4,16,-1,0,-1,-1,0,1,-1,1,1,-1,1,-1],
// 4 16 1 0 -1 -1 0 -1 -1 1 -1 1 1 -1
  [4,16,1,0,-1,-1,0,-1,-1,1,-1,1,1,-1],
// 4 16 1 0 1 1 0 -1 1 1 -1 1 1 1
  [4,16,1,0,1,1,0,-1,1,1,-1,1,1,1],
// 0
];
module ldraw_lib__box5_12(step=0, col=false, unit=2/5, alt=false, line=0.2, solid=!$preview)
    makepoly(ldraw_lib__box5_12(), step=step, col=col, unit=unit, alt=alt, line=line, solid=solid);
ldraw_lib__box5_12(line=0.2);
// file: s/3009s01.scad
use <../../lib.scad>
use <../../p/box5.scad>
use <../../p/stud.scad>
use <../../p/stud3.scad>
$fa=1; $fs=0.2;
function ldraw_lib__s__3009s01(realsolid=false) = [
// 0 ~Brick  1 x  6 without Front Face
// 0 Name: s\3009s01.dat
// 0 Author: James Jessiman
// 0 !LDRAW_ORG Subpart UPDATE 2003-03
// 0 !LICENSE Licensed under CC BY 2.0 and CC BY 4.0 : see CAreadme.txt
// 
// 0 BFC CERTIFY CCW
  [0,"BFC","CERTIFY"],
  [0,"BFC","CCW"],
// 
// 0 !HISTORY 2002-05-07 {unknown} BFC Certification
// 0 !HISTORY 2003-07-03 [Steffen] Subfiled for patterning
// 0 !HISTORY 2003-12-19 [PTadmin] Official Update 2003-03
// 0 !HISTORY 2007-08-29 [PTadmin] Header formatted for Contributor Agreement
// 0 !HISTORY 2008-07-01 [PTadmin] Official Update 2008-01
// 
// 
// 1 16 40 4 0 1 0 0 0 -5 0 0 0 1 stud3.dat
  [1,16,40,4,0,1,0,0,0,-5,0,0,0,1, ldraw_lib__stud3(realsolid)],
// 1 16 20 4 0 1 0 0 0 -5 0 0 0 1 stud3.dat
  [1,16,20,4,0,1,0,0,0,-5,0,0,0,1, ldraw_lib__stud3(realsolid)],
// 1 16 0 4 0 1 0 0 0 -5 0 0 0 1 stud3.dat
  [1,16,0,4,0,1,0,0,0,-5,0,0,0,1, ldraw_lib__stud3(realsolid)],
// 1 16 -20 4 0 1 0 0 0 -5 0 0 0 1 stud3.dat
  [1,16,-20,4,0,1,0,0,0,-5,0,0,0,1, ldraw_lib__stud3(realsolid)],
// 1 16 -40 4 0 1 0 0 0 -5 0 0 0 1 stud3.dat
  [1,16,-40,4,0,1,0,0,0,-5,0,0,0,1, ldraw_lib__stud3(realsolid)],
// 0 BFC INVERTNEXT
  [0,"BFC","INVERTNEXT"],
// 1 16 0 24 0 56 0 0 0 -20 0 0 0 6 box5.dat
  [1,16,0,24,0,56,0,0,0,-20,0,0,0,6, ldraw_lib__box5(realsolid)],
// 4 16 60 24 10 56 24 6 -56 24 6 -60 24 10
  [4,16,60,24,10,56,24,6,-56,24,6,-60,24,10],
// 4 16 -60 24 10 -56 24 6 -56 24 -6 -60 24 -10
  [4,16,-60,24,10,-56,24,6,-56,24,-6,-60,24,-10],
// 4 16 -60 24 -10 -56 24 -6 56 24 -6 60 24 -10
  [4,16,-60,24,-10,-56,24,-6,56,24,-6,60,24,-10],
// 4 16 60 24 -10 56 24 -6 56 24 6 60 24 10
  [4,16,60,24,-10,56,24,-6,56,24,6,60,24,10],
// 2 24 60 0 10 -60 0 10
  [2,24,60,0,10,-60,0,10],
// 2 24 -60 0 10 -60 0 -10
  [2,24,-60,0,10,-60,0,-10],
// 2 24 -60 0 -10 60 0 -10
  [2,24,-60,0,-10,60,0,-10],
// 2 24 60 0 -10 60 0 10
  [2,24,60,0,-10,60,0,10],
// 2 24 60 24 10 -60 24 10
  [2,24,60,24,10,-60,24,10],
// 2 24 -60 24 10 -60 24 -10
  [2,24,-60,24,10,-60,24,-10],
// 2 24 -60 24 -10 60 24 -10
  [2,24,-60,24,-10,60,24,-10],
// 2 24 60 24 -10 60 24 10
  [2,24,60,24,-10,60,24,10],
// 2 24 60 24 10 60 0 10
  [2,24,60,24,10,60,0,10],
// 2 24 -60 24 10 -60 0 10
  [2,24,-60,24,10,-60,0,10],
// 2 24 60 24 -10 60 0 -10
  [2,24,60,24,-10,60,0,-10],
// 2 24 -60 24 -10 -60 0 -10
  [2,24,-60,24,-10,-60,0,-10],
// 4 16 -60 0 -10 60 0 -10 60 0 10 -60 0 10
  [4,16,-60,0,-10,60,0,-10,60,0,10,-60,0,10],
// 4 16 -60 0 10 -60 24 10 -60 24 -10 -60 0 -10
  [4,16,-60,0,10,-60,24,10,-60,24,-10,-60,0,-10],
// 4 16 60 0 10 60 24 10 -60 24 10 -60 0 10
  [4,16,60,0,10,60,24,10,-60,24,10,-60,0,10],
// 4 16 60 0 -10 60 24 -10 60 24 10 60 0 10
  [4,16,60,0,-10,60,24,-10,60,24,10,60,0,10],
// 1 16 50 0 0 1 0 0 0 1 0 0 0 1 stud.dat
  [1,16,50,0,0,1,0,0,0,1,0,0,0,1, ldraw_lib__stud(realsolid)],
// 1 16 30 0 0 1 0 0 0 1 0 0 0 1 stud.dat
  [1,16,30,0,0,1,0,0,0,1,0,0,0,1, ldraw_lib__stud(realsolid)],
// 1 16 10 0 0 1 0 0 0 1 0 0 0 1 stud.dat
  [1,16,10,0,0,1,0,0,0,1,0,0,0,1, ldraw_lib__stud(realsolid)],
// 1 16 -10 0 0 1 0 0 0 1 0 0 0 1 stud.dat
  [1,16,-10,0,0,1,0,0,0,1,0,0,0,1, ldraw_lib__stud(realsolid)],
// 1 16 -30 0 0 1 0 0 0 1 0 0 0 1 stud.dat
  [1,16,-30,0,0,1,0,0,0,1,0,0,0,1, ldraw_lib__stud(realsolid)],
// 1 16 -50 0 0 1 0 0 0 1 0 0 0 1 stud.dat
  [1,16,-50,0,0,1,0,0,0,1,0,0,0,1, ldraw_lib__stud(realsolid)],
// 0
];
module ldraw_lib__s__3009s01(step=0, col=false, unit=2/5, alt=false, line=0.2, solid=!$preview)
    makepoly(ldraw_lib__s__3009s01(solid), step=step, col=col, unit=unit, alt=alt, line=line, solid=solid);
ldraw_lib__s__3009s01(line=0.2);
// file: 004659a.scad
use <../lib.scad>
use <../p/box5-12.scad>
use <s/004659as01.scad>
function ldraw_lib__004659a() = [
// 0 Sticker  1 x  1 Fire Emblem
// 0 Name: 004659a.dat
// 0 Author: Alex Taylor [anathema]
// 0 !LDRAW_ORG Part UPDATE 2013-01
// 0 !LICENSE Licensed under CC BY 4.0 : see CAreadme.txt
// 
// 0 BFC CERTIFY CCW
  [0,"BFC","CERTIFY"],
  [0,"BFC","CCW"],
// 
// 0 !HISTORY 2013-03-17 [MagFors] Used box primitive
// 0 !HISTORY 2013-07-21 [PTadmin] Official Update 2013-01
// 
// 
// 1 16 0 -0.25 0 1 0 0 0 1 0 0 0 1 s\004659as01.dat
  [1,16,0,-0.25,0,1,0,0,0,1,0,0,0,1, ldraw_lib__s__004659as01()],
// 1 16 0 -0.25 0 10 0 0 0 0.25 0 0 0 10 box5-12.dat
  [1,16,0,-0.25,0,10,0,0,0,0.25,0,0,0,10, ldraw_lib__box5_12()],
];
module ldraw_lib__004659a(step=0, col=false, unit=2/5, alt=false, line=0.2, solid=!$preview)
    makepoly(ldraw_lib__004659a(), step=step, col=col, unit=unit, alt=alt, line=line, solid=solid);
ldraw_lib__004659a(line=0.2);
// file: 3009.scad
use <../lib.scad>
use <s/3009s01.scad>
function ldraw_lib__3009() = [
// 0 Brick  1 x  6
// 0 Name: 3009.dat
// 0 Author: James Jessiman
// 0 !LDRAW_ORG Part UPDATE 2003-03
// 0 !LICENSE Licensed under CC BY 4.0 : see CAreadme.txt
// 
// 0 BFC CERTIFY CCW
  [0,"BFC","CERTIFY"],
  [0,"BFC","CCW"],
// 
// 0 !HISTORY 2001-10-26 [PTadmin] Official Update 2001-01
// 0 !HISTORY 2002-05-07 {unknown} BFC Certification
// 0 !HISTORY 2002-06-11 [PTadmin] Official Update 2002-03
// 0 !HISTORY 2003-07-03 [Steffen] Subfiled for patterning
// 0 !HISTORY 2003-12-19 [PTadmin] Official Update 2003-03
// 0 !HISTORY 2007-06-06 [PTadmin] Header formatted for Contributor Agreement
// 0 !HISTORY 2008-07-01 [PTadmin] Official Update 2008-01
// 
// 
// 1 16 0 0 0 1 0 0 0 1 0 0 0 1 s\3009s01.dat
  [1,16,0,0,0,1,0,0,0,1,0,0,0,1, ldraw_lib__s__3009s01()],
// 4 16 -60 0 -10 -60 24 -10 60 24 -10 60 0 -10
  [4,16,-60,0,-10,-60,24,-10,60,24,-10,60,0,-10],
// 0
];
module ldraw_lib__3009(step=0, col=false, unit=2/5, alt=false, line=0.2, solid=!$preview)
    makepoly(ldraw_lib__3009(), step=step, col=col, unit=unit, alt=alt, line=line, solid=solid);
ldraw_lib__3009(line=0.2);
// file: 004452e.scad
use <../lib.scad>
use <004659a.scad>
function ldraw_lib__004452e() = [
// 0 =Sticker  1 x  1 Fire Emblem
// 0 Name: 004452e.dat
// 0 Author: Takeshi Takahashi [RainbowDolphin]
// 0 !LDRAW_ORG Part Alias UPDATE 2024-05
// 0 !LICENSE Licensed under CC BY 4.0 : see CAreadme.txt
// 
// 0 BFC CERTIFY CCW
  [0,"BFC","CERTIFY"],
  [0,"BFC","CCW"],
// 
// 0 !KEYWORDS Bricklink 374.1stk01, Brickowl 954932, Fire engine, Fire Station
// 0 !KEYWORDS Rebrickable 4452stk, Set 374-1
// 
// 0 !HISTORY 2024-06-30 [OrionP] Official Update 2024-05
// 
// 
// 0 // Alias of 004659a
// 1 16 0 0 0 1 0 0 0 1 0 0 0 1 004659a.dat
  [1,16,0,0,0,1,0,0,0,1,0,0,0,1, ldraw_lib__004659a()],
];
module ldraw_lib__004452e(step=0, col=false, unit=2/5, alt=false, line=0.2, solid=!$preview)
    makepoly(ldraw_lib__004452e(), step=step, col=col, unit=unit, alt=alt, line=line, solid=solid);
ldraw_lib__004452e(line=0.2);
// main file
use <../lib.scad>
use <004452e.scad>
use <3009.scad>
function ldraw_lib__3009d02() = [
// 0 Brick  1 x  8 with Fire Logo Left Sticker
// 0 Name: 3009d02.dat
// 0 Author: Takeshi Takahashi [RainbowDolphin]
// 0 !LDRAW_ORG Shortcut UPDATE 2024-05
// 0 !LICENSE Licensed under CC BY 4.0 : see CAreadme.txt
// 
// 0 BFC CERTIFY CCW
  [0,"BFC","CERTIFY"],
  [0,"BFC","CCW"],
// 
// 0 !CATEGORY Sticker Shortcut
// 0 !KEYWORDS Bricklink 3009pb043L, Fire engine, Set 374-1, Set 590-1
// 
// 0 !HISTORY 2024-06-30 [OrionP] Official Update 2024-05
// 
// 1 16 0 0 0 1 0 0 0 1 0 0 0 1 3009.dat
  [1,16,0,0,0,1,0,0,0,1,0,0,0,1, ldraw_lib__3009()],
// 1 16 -40 12 -10 1 0 0 0 0 -1 0 1 0 004452e.dat
  [1,16,-40,12,-10,1,0,0,0,0,-1,0,1,0, ldraw_lib__004452e()],
];
module ldraw_lib__3009d02(step=0, col=false, unit=2/5, alt=false, line=0.2, solid=!$preview)
    makepoly(ldraw_lib__3009d02(), step=step, col=col, unit=unit, alt=alt, line=line, solid=solid);
ldraw_lib__3009d02(line=0.2);
